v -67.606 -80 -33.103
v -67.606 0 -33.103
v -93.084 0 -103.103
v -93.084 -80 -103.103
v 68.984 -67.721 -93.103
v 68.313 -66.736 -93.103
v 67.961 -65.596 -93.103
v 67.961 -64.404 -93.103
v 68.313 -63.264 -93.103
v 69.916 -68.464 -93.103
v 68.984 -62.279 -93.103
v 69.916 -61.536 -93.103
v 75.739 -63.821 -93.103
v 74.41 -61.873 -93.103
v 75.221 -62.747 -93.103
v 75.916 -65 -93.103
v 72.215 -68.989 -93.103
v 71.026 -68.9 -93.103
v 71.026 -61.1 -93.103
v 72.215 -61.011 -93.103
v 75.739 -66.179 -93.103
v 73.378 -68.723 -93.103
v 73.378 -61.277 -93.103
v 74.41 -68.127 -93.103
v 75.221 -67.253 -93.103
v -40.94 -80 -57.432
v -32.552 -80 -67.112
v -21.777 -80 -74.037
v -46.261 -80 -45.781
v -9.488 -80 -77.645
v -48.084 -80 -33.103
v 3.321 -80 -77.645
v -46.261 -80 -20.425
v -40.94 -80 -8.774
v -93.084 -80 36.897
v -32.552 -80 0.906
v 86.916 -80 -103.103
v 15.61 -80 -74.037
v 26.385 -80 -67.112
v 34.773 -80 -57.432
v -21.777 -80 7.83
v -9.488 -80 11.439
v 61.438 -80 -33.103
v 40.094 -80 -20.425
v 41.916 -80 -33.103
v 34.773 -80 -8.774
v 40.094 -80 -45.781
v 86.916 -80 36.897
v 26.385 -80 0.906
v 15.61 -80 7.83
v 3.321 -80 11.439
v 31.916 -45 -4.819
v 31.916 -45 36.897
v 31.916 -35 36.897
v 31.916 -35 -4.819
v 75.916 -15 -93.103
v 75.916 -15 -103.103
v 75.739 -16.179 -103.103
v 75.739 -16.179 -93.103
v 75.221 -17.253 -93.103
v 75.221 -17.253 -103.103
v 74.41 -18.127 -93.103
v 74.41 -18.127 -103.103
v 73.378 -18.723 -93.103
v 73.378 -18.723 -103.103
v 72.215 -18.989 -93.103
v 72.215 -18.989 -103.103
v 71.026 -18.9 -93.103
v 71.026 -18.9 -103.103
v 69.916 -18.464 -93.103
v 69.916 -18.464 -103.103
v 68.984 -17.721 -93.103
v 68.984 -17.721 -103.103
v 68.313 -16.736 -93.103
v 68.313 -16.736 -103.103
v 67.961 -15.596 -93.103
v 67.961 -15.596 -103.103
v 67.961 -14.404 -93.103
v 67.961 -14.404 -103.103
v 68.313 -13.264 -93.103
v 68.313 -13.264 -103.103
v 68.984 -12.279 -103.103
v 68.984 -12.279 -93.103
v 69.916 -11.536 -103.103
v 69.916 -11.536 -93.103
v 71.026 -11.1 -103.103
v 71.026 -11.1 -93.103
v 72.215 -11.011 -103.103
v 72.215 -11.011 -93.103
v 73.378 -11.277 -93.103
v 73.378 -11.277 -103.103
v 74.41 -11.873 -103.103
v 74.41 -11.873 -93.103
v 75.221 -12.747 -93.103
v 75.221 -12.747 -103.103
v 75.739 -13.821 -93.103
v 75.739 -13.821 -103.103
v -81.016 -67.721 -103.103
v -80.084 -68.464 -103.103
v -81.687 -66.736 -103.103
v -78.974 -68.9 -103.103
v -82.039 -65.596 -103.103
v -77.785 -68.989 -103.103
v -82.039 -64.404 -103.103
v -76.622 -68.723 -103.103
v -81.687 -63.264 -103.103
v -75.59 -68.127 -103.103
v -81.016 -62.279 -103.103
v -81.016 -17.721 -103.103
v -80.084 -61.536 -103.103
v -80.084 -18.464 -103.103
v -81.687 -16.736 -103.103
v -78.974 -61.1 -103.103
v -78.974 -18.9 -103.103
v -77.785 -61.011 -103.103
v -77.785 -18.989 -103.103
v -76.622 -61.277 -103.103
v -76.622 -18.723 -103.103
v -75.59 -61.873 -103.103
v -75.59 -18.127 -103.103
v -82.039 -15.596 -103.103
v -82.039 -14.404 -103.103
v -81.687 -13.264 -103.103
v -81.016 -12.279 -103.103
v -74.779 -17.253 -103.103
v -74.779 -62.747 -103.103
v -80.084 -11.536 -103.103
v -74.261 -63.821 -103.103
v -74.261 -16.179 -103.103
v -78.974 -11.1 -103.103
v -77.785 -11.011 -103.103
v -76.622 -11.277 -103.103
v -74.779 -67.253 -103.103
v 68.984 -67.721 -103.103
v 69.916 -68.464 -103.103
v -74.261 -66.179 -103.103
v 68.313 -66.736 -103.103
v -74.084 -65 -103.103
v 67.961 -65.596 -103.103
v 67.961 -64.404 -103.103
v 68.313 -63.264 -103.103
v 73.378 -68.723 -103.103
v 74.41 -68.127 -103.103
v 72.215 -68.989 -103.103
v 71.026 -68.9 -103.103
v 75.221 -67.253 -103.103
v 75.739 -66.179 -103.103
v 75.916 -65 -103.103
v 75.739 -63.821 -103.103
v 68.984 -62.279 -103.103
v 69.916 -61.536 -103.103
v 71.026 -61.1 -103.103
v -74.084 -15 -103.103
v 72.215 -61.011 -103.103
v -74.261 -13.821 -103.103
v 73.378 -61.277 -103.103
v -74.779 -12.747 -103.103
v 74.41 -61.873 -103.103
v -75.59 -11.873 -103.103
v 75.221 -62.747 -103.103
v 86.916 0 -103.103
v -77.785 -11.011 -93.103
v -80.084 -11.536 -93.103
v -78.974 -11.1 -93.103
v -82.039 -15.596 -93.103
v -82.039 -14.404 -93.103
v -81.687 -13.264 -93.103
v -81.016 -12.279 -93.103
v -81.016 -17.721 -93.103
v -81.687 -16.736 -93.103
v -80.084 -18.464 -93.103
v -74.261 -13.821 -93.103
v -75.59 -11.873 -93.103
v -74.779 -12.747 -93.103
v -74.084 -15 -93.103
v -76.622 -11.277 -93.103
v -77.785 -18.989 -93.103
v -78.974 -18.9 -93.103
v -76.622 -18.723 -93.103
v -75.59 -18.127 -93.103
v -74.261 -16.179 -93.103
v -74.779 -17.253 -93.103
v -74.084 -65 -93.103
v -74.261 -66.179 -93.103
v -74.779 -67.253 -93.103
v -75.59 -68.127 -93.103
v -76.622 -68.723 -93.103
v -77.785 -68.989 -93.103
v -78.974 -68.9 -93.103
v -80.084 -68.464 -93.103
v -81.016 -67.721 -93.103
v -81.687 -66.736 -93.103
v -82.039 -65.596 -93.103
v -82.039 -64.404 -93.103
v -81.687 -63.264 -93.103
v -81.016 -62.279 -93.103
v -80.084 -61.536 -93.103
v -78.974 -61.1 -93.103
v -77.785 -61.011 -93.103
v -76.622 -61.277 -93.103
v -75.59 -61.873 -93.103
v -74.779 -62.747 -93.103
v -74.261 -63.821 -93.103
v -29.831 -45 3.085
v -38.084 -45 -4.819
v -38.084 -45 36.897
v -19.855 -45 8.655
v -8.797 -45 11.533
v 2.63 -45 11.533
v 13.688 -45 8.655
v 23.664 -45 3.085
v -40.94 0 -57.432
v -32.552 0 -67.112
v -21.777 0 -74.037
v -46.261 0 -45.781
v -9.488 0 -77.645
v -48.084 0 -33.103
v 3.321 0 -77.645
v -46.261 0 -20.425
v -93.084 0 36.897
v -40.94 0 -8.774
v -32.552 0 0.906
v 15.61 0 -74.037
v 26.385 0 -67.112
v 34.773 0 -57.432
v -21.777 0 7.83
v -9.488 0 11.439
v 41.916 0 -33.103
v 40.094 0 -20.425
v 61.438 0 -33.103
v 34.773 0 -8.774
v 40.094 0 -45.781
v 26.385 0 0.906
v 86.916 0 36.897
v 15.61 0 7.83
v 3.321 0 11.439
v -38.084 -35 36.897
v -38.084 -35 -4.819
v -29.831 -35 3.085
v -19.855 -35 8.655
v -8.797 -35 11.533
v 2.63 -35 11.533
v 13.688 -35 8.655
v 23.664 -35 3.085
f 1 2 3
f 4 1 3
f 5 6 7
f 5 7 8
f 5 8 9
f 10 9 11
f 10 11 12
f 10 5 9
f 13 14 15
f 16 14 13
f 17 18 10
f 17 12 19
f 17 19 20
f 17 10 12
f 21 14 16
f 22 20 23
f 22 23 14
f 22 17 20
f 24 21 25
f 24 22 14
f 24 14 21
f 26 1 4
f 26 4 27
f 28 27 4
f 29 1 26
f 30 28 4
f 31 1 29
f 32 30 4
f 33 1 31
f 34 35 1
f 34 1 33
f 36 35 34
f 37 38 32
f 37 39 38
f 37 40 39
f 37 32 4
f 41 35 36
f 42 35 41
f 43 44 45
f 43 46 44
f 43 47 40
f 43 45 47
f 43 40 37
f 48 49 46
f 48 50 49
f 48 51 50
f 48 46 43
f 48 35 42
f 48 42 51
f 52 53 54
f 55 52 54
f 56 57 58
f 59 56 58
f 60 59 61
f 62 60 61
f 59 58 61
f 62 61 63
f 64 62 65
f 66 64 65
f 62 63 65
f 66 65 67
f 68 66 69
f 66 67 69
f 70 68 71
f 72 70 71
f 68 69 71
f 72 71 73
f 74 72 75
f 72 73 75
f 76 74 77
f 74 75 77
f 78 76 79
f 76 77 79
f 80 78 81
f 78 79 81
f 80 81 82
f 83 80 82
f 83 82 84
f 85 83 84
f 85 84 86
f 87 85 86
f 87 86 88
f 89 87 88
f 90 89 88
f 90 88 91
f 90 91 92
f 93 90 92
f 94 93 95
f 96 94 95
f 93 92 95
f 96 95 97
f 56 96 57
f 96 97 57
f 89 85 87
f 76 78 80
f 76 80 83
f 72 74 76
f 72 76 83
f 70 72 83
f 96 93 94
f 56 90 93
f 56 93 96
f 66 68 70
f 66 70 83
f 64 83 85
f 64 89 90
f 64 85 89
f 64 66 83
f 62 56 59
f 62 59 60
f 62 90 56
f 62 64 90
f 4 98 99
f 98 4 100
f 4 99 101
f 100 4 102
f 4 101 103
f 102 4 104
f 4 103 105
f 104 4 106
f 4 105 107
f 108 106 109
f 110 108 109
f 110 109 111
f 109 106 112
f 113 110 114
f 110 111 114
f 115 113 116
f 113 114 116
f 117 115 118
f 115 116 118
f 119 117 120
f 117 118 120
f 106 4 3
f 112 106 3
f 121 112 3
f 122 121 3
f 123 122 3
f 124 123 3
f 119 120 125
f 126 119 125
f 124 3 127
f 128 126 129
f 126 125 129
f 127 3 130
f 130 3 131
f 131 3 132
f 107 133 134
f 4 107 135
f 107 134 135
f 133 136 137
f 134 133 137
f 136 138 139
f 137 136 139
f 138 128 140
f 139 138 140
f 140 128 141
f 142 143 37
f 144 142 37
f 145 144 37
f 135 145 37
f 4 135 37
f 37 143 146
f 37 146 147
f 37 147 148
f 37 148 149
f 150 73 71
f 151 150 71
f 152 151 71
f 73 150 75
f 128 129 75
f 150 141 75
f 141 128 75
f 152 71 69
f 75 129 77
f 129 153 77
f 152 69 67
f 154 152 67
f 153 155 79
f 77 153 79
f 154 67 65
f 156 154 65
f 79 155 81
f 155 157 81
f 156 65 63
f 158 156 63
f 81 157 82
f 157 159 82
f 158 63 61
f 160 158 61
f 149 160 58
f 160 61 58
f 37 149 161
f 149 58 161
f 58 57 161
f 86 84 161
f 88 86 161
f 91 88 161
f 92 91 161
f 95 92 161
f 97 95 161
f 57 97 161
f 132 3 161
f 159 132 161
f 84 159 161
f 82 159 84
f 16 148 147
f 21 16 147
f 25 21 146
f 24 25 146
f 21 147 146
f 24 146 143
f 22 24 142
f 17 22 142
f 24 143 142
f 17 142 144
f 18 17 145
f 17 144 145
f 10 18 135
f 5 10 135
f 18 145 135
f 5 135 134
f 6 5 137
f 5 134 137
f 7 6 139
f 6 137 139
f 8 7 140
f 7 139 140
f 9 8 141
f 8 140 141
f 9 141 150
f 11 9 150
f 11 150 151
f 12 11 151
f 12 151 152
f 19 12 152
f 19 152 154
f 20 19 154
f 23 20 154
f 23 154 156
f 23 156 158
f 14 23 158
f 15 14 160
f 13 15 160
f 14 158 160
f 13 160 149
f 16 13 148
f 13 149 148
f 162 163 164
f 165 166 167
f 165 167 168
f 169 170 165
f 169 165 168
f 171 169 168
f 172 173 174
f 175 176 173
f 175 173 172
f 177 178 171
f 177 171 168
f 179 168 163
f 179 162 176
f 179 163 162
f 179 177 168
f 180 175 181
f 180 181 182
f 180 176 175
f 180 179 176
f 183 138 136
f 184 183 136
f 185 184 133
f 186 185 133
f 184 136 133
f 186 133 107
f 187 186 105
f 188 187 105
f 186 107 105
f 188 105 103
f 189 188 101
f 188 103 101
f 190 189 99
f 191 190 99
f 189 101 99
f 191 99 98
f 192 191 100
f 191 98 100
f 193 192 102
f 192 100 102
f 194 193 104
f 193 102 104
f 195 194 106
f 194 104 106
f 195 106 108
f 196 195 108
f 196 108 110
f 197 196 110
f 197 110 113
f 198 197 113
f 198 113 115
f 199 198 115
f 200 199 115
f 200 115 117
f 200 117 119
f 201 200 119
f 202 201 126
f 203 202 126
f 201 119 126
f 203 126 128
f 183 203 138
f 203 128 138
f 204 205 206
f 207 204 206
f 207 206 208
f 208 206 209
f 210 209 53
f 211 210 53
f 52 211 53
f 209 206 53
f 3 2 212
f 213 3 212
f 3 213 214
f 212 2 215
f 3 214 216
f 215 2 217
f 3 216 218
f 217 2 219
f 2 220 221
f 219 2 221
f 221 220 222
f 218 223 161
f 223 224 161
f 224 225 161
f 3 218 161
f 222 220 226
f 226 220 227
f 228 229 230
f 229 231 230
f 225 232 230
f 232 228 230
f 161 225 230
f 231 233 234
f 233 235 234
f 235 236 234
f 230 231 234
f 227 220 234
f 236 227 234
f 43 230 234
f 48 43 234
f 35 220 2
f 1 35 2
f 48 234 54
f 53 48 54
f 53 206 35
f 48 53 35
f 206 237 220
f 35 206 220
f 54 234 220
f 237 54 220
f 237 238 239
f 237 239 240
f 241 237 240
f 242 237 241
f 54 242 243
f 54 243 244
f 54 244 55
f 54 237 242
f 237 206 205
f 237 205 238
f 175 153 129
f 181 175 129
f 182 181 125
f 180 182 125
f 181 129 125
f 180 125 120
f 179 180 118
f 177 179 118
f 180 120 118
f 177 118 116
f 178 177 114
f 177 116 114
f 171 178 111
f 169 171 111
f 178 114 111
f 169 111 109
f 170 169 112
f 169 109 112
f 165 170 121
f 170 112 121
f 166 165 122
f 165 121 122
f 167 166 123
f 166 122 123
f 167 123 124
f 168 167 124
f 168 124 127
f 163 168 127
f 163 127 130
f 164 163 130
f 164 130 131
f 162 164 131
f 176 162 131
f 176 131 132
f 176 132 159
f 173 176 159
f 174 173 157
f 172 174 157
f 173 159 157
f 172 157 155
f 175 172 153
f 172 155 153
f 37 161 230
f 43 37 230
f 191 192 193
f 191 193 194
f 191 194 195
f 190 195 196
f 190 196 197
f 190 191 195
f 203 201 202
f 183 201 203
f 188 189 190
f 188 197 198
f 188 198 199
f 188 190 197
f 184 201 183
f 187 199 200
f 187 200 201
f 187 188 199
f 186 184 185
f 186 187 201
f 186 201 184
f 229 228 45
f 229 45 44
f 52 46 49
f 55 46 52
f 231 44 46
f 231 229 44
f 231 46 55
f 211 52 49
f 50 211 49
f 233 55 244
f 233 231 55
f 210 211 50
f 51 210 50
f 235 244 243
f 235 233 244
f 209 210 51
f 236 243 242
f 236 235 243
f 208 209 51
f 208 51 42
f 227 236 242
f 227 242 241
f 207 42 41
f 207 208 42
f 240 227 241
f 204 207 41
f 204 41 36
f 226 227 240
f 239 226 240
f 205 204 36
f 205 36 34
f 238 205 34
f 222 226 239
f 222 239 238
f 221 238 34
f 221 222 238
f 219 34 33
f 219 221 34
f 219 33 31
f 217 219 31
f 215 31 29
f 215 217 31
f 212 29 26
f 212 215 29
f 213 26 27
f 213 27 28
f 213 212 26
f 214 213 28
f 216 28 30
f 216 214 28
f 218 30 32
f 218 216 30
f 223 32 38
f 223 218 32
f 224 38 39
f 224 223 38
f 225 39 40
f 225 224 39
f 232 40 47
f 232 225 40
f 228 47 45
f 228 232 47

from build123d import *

# Parameters (mm, degrees)
F0_R     = 45
F1_DEPTH = 80
F2_R     = 4
F3_DEPTH = 10
F4_W     = 70
F4_H     = 10
F5_DEPTH = 53.5


with BuildPart() as f1:
    # F0 (on Front) → F1 (new body)
    with BuildSketch(Plane.XZ):
        Polygon((86.916415, 36.896855), (-93.083585, 36.896855), (-67.605668, -33.103145), (-93.083585, -103.103145), (86.916415, -103.103145), (61.438499, -33.103145), align=None)
        with Locations((-3.083585, -33.103145)):
            Circle(F0_R, mode=Mode.SUBTRACT)
    extrude(amount=F1_DEPTH)

    # F2 (on face) → F3 (cut)
    with BuildSketch(Plane(origin=(0, 0, -103.103145), x_dir=(1, 0, 0), z_dir=(0, 0, -1))):
        with Locations((-78.083585, 65)):
            Circle(F2_R)
        with Locations((-78.083585, 15)):
            Circle(F2_R)
        with Locations((71.916415, 15)):
            Circle(F2_R)
        with Locations((71.916415, 65)):
            Circle(F2_R)
    extrude(amount=-F3_DEPTH, mode=Mode.SUBTRACT)

    # F4 (on face) → F5 (cut)
    with BuildSketch(Plane.XY.offset(36.896855)):
        with Locations((-3.083585, -40)):
            Rectangle(F4_W, F4_H)
    extrude(amount=-F5_DEPTH, mode=Mode.SUBTRACT)


solid = f1.part
